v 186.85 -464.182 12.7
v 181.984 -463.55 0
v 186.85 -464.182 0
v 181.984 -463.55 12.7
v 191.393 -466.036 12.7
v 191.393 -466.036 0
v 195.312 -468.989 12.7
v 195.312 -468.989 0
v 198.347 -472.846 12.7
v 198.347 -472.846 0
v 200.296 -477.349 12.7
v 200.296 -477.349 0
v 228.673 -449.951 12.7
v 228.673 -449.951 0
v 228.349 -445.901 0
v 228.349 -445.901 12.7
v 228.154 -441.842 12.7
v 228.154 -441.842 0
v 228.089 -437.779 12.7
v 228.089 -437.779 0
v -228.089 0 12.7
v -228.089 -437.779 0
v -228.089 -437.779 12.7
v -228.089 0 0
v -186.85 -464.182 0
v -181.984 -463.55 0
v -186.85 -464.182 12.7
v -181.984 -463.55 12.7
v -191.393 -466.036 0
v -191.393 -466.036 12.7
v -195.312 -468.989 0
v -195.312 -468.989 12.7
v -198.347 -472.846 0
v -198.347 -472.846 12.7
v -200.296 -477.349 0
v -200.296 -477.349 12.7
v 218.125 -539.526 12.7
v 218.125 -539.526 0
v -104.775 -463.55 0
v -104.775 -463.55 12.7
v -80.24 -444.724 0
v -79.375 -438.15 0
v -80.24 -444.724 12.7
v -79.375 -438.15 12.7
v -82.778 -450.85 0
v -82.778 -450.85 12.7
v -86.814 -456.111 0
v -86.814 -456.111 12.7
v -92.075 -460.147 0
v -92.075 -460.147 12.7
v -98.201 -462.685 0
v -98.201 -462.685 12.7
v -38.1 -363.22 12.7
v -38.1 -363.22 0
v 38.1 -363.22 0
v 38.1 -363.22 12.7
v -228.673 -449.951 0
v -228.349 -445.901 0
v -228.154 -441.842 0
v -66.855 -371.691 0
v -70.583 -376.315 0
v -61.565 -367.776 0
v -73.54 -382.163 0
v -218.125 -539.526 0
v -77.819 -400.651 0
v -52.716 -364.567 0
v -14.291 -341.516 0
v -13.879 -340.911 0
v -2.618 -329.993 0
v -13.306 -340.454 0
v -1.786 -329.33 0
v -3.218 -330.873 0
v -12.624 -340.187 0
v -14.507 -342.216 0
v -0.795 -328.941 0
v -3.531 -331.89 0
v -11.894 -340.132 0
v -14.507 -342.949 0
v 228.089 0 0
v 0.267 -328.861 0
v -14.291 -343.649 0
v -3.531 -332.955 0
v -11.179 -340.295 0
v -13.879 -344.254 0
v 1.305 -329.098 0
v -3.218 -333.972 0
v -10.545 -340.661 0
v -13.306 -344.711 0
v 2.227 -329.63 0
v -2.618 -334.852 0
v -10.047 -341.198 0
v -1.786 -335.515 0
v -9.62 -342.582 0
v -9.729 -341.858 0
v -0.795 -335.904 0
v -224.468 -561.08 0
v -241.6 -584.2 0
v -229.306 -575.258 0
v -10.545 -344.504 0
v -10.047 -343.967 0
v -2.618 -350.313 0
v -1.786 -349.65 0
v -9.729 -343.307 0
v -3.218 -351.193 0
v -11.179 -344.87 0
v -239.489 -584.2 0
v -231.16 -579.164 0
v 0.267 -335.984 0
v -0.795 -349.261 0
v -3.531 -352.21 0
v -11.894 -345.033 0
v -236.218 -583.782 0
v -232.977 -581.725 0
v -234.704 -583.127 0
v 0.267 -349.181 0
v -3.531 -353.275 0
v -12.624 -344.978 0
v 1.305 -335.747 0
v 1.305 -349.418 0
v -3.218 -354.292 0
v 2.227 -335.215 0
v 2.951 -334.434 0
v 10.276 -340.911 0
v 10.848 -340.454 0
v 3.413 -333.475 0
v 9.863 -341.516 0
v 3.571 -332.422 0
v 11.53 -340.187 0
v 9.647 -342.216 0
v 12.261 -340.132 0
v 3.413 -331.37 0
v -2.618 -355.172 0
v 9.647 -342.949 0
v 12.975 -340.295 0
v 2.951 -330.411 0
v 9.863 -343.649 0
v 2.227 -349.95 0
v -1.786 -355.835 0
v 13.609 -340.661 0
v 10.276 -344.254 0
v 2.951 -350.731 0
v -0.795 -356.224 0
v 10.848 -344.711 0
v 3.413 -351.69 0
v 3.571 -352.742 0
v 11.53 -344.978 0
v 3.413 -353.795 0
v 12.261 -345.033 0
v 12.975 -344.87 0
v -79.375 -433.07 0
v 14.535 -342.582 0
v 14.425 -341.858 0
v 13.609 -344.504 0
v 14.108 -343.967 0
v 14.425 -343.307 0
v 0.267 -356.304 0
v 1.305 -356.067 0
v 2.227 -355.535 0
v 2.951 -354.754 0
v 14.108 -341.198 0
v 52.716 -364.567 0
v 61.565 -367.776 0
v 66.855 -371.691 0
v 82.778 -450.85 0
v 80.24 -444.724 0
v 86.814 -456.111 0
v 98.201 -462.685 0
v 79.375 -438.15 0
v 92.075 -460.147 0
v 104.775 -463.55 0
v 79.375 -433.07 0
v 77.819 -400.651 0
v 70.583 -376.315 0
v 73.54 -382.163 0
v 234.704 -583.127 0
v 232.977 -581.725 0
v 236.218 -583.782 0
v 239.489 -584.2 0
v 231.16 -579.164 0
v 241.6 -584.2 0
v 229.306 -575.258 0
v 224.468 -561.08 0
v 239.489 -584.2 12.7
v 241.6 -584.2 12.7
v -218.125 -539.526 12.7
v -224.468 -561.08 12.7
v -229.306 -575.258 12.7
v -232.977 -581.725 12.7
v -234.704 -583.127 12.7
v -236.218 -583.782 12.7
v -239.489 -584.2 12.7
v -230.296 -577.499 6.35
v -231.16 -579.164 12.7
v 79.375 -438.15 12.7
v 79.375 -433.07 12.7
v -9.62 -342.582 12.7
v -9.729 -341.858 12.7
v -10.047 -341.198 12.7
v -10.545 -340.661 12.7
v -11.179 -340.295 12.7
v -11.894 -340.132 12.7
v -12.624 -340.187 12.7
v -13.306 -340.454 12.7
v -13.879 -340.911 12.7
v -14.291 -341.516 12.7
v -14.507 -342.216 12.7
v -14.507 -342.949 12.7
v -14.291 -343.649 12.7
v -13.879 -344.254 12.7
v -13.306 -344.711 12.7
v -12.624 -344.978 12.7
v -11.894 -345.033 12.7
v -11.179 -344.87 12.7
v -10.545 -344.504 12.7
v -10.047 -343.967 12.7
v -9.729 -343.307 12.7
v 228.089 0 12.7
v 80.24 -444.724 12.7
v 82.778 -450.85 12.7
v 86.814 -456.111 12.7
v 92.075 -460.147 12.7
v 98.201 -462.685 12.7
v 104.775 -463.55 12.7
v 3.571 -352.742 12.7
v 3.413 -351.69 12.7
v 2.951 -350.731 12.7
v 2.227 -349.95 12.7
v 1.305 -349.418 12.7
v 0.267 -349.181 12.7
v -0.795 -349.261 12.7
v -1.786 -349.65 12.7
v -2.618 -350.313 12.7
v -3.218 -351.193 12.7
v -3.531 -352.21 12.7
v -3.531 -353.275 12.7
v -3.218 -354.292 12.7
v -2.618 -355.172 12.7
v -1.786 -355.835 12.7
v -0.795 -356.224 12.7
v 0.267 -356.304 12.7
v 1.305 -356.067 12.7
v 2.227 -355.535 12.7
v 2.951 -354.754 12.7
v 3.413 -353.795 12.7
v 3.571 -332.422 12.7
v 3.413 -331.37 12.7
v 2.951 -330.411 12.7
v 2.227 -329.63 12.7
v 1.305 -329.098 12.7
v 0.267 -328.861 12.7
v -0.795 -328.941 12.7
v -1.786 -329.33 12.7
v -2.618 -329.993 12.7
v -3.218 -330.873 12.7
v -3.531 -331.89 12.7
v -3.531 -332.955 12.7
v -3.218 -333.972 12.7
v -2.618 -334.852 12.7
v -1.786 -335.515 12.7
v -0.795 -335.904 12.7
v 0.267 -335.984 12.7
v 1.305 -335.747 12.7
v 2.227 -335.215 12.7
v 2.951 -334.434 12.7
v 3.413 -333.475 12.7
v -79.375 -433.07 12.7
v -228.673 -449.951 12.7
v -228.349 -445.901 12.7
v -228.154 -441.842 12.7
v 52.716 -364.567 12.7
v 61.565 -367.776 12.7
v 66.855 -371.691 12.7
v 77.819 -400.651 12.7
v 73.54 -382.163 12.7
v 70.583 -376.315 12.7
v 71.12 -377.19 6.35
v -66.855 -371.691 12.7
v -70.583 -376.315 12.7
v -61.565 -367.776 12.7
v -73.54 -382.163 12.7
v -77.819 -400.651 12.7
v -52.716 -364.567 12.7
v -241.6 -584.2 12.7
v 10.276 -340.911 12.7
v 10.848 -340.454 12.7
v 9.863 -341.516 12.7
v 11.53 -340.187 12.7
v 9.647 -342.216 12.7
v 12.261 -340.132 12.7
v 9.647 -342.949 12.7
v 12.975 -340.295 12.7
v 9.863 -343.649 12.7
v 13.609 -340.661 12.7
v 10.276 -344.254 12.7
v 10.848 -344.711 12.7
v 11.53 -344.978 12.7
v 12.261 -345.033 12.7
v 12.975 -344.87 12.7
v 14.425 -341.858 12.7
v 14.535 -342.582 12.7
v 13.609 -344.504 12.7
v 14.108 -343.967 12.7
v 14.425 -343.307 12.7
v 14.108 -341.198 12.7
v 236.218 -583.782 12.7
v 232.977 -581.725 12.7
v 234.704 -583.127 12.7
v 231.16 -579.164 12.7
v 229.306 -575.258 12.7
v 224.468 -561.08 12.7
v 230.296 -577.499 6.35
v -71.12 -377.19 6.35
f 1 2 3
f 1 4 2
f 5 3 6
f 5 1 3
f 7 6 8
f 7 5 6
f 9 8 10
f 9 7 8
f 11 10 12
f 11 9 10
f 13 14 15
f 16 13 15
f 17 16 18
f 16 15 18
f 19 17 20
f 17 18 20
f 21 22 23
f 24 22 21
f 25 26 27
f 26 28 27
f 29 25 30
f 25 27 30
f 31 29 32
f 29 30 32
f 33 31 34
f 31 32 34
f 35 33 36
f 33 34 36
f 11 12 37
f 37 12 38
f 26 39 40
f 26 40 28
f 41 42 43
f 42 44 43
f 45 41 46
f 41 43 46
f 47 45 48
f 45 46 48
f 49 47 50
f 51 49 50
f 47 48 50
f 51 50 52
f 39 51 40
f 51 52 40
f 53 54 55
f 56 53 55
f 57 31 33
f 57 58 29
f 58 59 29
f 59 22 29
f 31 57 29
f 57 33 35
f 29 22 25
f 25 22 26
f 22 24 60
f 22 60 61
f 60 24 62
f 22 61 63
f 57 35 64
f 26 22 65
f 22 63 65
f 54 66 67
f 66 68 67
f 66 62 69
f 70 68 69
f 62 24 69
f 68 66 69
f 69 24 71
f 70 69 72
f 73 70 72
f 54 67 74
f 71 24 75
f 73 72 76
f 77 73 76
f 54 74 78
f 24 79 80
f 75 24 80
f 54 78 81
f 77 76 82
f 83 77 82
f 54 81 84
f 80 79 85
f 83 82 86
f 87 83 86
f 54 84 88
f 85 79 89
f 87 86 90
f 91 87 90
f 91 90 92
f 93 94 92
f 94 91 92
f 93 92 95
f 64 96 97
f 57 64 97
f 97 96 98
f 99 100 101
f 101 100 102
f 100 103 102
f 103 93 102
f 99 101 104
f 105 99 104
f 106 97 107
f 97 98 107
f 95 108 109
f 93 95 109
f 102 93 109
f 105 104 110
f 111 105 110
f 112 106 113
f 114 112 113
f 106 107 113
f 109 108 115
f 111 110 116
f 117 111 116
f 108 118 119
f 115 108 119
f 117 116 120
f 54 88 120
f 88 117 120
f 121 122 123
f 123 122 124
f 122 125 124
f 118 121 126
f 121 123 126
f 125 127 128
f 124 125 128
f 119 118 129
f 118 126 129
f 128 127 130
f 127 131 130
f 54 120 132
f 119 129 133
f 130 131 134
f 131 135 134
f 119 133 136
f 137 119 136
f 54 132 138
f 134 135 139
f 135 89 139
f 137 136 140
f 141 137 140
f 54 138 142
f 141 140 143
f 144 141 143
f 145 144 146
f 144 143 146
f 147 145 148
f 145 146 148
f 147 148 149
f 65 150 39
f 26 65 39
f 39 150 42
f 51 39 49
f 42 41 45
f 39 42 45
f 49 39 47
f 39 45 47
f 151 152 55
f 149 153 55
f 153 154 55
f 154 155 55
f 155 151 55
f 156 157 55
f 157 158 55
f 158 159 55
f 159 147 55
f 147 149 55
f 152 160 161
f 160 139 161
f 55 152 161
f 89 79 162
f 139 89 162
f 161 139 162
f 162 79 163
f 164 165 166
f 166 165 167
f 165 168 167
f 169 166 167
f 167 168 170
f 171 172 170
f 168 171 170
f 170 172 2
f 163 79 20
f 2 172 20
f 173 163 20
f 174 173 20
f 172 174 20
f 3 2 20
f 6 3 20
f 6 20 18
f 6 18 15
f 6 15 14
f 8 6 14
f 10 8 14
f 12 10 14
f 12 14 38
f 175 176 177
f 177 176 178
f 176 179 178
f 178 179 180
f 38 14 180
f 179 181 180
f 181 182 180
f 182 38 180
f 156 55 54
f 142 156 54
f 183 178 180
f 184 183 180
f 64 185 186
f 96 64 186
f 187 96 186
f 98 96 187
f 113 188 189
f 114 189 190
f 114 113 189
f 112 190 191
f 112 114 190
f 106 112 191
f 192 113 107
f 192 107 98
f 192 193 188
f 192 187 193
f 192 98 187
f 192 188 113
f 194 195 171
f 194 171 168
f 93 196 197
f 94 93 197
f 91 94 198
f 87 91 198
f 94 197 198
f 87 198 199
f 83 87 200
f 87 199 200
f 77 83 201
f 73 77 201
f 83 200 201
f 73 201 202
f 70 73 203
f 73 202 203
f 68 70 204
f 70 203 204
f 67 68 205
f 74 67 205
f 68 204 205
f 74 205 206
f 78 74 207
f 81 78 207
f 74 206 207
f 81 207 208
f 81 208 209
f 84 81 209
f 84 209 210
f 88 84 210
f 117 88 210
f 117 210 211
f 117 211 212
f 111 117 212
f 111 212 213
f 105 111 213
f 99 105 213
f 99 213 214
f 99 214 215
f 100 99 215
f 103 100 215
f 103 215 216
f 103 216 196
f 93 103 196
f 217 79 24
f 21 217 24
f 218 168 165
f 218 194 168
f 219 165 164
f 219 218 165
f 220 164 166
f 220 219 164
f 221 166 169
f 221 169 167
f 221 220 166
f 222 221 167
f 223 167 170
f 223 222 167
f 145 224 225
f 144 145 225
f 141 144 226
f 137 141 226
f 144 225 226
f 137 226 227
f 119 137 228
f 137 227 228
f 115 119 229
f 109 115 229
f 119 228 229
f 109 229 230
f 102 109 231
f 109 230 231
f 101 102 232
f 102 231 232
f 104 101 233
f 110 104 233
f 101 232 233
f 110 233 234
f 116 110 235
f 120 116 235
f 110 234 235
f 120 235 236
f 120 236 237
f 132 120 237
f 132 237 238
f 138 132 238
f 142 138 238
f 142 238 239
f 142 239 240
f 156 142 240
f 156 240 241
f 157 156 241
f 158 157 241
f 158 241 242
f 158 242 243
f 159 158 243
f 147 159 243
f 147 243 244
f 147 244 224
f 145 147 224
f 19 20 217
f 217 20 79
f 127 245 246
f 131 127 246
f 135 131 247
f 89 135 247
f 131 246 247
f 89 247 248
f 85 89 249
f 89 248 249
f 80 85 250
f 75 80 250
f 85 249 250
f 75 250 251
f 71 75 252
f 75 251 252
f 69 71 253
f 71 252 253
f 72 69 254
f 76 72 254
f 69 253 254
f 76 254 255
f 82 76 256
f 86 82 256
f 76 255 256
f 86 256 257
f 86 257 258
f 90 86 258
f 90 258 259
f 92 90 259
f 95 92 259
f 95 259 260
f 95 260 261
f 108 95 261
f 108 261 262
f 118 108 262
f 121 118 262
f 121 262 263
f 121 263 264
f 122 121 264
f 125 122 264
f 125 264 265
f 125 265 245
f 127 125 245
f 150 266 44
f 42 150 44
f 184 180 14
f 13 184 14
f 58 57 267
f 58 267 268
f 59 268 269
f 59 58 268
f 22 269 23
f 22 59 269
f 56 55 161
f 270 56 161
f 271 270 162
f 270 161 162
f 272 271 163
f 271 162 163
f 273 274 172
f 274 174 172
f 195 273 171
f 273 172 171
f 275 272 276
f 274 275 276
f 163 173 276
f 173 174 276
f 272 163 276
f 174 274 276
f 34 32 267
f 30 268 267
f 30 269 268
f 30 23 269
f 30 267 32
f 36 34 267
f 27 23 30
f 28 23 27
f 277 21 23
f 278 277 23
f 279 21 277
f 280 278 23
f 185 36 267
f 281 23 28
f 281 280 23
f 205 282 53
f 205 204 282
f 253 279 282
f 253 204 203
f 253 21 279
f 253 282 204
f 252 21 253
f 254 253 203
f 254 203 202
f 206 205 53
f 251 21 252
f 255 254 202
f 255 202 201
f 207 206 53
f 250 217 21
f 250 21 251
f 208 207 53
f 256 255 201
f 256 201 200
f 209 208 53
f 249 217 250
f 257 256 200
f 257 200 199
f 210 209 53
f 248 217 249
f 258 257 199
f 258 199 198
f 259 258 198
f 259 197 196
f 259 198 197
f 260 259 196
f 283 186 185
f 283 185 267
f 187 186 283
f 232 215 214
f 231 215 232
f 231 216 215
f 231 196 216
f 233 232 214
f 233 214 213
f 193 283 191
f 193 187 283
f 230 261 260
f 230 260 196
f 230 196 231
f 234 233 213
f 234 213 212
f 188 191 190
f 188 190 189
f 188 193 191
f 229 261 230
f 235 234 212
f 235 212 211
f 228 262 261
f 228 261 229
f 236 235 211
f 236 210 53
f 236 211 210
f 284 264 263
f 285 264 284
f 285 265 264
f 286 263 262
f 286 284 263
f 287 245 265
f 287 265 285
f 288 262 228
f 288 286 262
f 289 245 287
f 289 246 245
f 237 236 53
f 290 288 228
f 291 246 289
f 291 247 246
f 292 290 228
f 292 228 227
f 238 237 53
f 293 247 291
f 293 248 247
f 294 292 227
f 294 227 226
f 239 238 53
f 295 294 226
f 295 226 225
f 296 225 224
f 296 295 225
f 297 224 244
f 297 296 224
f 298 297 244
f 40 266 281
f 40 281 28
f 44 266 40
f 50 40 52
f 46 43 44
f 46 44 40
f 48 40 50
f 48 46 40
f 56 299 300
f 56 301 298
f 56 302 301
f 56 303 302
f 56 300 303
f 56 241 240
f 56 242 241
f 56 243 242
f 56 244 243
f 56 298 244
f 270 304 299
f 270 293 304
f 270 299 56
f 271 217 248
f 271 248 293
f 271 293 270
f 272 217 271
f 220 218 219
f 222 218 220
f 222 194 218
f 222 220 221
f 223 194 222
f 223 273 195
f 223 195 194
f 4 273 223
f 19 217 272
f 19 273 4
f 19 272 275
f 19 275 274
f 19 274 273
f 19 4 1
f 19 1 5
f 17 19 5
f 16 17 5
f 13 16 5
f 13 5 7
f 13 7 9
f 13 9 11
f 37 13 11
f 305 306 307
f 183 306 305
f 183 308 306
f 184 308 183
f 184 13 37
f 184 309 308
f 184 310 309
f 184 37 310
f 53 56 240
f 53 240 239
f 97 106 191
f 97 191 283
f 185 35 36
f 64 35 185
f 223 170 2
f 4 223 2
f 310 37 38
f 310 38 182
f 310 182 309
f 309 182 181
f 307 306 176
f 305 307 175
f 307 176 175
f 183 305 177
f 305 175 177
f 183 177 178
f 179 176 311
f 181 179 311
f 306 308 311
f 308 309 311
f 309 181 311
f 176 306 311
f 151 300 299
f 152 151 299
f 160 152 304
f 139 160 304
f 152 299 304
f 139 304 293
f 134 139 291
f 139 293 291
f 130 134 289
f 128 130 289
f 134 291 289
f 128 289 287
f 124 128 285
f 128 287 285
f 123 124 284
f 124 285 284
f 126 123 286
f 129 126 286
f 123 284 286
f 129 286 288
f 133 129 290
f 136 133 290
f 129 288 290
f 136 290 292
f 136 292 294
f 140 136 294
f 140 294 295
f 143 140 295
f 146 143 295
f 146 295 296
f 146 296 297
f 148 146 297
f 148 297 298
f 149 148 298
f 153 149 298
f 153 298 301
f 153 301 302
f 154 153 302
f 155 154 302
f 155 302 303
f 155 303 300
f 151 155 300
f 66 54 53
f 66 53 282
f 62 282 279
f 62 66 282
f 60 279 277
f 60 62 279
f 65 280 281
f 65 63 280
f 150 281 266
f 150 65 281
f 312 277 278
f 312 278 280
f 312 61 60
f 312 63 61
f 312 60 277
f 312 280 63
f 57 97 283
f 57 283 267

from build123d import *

# Parameters (mm, degrees)
BOSS_EXTRUDE1_DEPTH     = 12.7
FILLET2_SIZE            = 41.275
FILLET2_SIZE_2          = 69.85
FILLET3_R               = 25.4
FILLET4_R               = 19.05
FILLET6_R               = 127
CUT_EXTRUDE1_REACH      = 634.314
SKETCH3_W               = 241.600142069
SKETCH3_H               = 584.2
F_8_CLEARANCE_HOLE1_D   = 4.9149
F_1_4_CLEARANCE_HOLE1_D = 7.14248


with BuildPart() as part:
    # Sketch1 → Boss-Extrude1 (new body)
    with BuildSketch(Plane.XY):
        Polygon((-228.088766336, 0), (228.088766336, 0), (228.088766336, -443.878997916), (241.600142069, -584.2), (230.934597128, -584.2), (196.338766336, -463.55), (79.375, -463.55), (79.375, -363.22), (-79.375, -363.22), (-79.375, -463.55), (-196.338766336, -463.55), (-230.934597128, -584.2), (-241.600142069, -584.2), (-228.088766336, -443.878997916), align=None)
    extrude(amount=BOSS_EXTRUDE1_DEPTH)

    # Fillet2
    # a fillet whose section is not a circle: 69.85, 41.275 mm, written as the material it adds along each edge
    with BuildSketch(Plane(origin=(-79.375, -363.22, 0), x_dir=(1, 0, 0), z_dir=(0, 0, 1))) as fillet2_piece_1:
        with BuildLine():
            Bezier((FILLET2_SIZE, 0), (0, 0), (0, -FILLET2_SIZE_2), weights=[1, 1.5, 1])
            Line((0, -FILLET2_SIZE_2), (0, 0))
            Line((0, 0), (FILLET2_SIZE, 0))
        make_face()
    extrude(amount=12.7)

    # Fillet3
    fillet3_edges = [part.edges().sort_by_distance(p)[0] for p in [
        (-79.375, -463.55, 6.35),
    ]]
    fillet(fillet3_edges, radius=FILLET3_R)

    # Fillet4
    fillet4_edges = [part.edges().sort_by_distance(p)[0] for p in [
        (-196.338766336, -463.55, 6.35),
    ]]
    fillet(fillet4_edges, radius=FILLET4_R)

    # Fillet5
    # a fillet whose section is not a circle: 50.8, 22.225 mm, written as the material it takes off along each edge
    with BuildSketch(Plane(origin=(-230.934597128, -584.2, -116.185737858), x_dir=(0.2756373558169957, 0.9612616959383199, 0), z_dir=(0, 0, 1))) as fillet5_piece_1:
        with BuildLine():
            Bezier((46.474295143, 0), (0, 0), (-2.35779901, 8.222622324), weights=[1, 2.333333333, 1])
            Line((-2.35779901, 8.222622324), (0, 0))
            Line((0, 0), (46.474295143, 0))
        make_face()
    extrude(amount=245.071475716, mode=Mode.SUBTRACT)

    # Fillet6
    # the kernel refuses this fillet: 127 mm, written as the material it adds along each edge
    with BuildSketch(Plane(origin=(-228.088766336, -443.878997916, 0), x_dir=(0, 1, 0), z_dir=(0, 0, 1))) as fillet6_piece_1:
        with BuildLine():
            CenterArc((FILLET6_R * 0.0480334444852, FILLET6_R), FILLET6_R, 264.5, 5.5)
            Line((-FILLET6_R * 0.047812308035, FILLET6_R * 0.00460380163282), (0, 0))
            Line((0, 0), (FILLET6_R * 0.0480334444852, 0))
        make_face()
    extrude(amount=12.7)

    # Sketch3 → Cut-Extrude1 (cut, up to next)
    with BuildSketch(Plane.XY.offset(12.7), mode=Mode.PRIVATE) as cut_extrude1_sk1:
        with Locations((120.800071035, -292.1)):
            Rectangle(SKETCH3_W, SKETCH3_H)
    cut_extrude1_tool1 = extrude(cut_extrude1_sk1.sketch, amount=-CUT_EXTRUDE1_REACH, mode=Mode.PRIVATE) & part.part
    add(cut_extrude1_tool1.solids().sort_by_distance((120.800071, -292.1, 12.7))[0], mode=Mode.SUBTRACT)

    # Mirror5: part across plane


with BuildPart() as part_1:
    add(part.part)
    add(part.part.mirror(Plane(origin=(0, 0, -0.35025), x_dir=(0, 0, 1), z_dir=(-1, 0, 0))))

    # #8 Clearance Hole1 (through all)
    with Locations(Plane(origin=(0, 0, 0), x_dir=(-1, 0, 0), z_dir=(0, 0, -1))):
        with Locations((12.077216058, -342.5825), (-12.077216058, -342.5825)):
            Hole(F_8_CLEARANCE_HOLE1_D / 2)

    # 1/4 Clearance Hole1 (through all)
    with Locations(Plane(origin=(0, 0, 0), x_dir=(-1, 0, 0), z_dir=(0, 0, -1))):
        with Locations((0, -352.7425), (0, -332.4225)):
            Hole(F_1_4_CLEARANCE_HOLE1_D / 2)


solid = part_1.part
